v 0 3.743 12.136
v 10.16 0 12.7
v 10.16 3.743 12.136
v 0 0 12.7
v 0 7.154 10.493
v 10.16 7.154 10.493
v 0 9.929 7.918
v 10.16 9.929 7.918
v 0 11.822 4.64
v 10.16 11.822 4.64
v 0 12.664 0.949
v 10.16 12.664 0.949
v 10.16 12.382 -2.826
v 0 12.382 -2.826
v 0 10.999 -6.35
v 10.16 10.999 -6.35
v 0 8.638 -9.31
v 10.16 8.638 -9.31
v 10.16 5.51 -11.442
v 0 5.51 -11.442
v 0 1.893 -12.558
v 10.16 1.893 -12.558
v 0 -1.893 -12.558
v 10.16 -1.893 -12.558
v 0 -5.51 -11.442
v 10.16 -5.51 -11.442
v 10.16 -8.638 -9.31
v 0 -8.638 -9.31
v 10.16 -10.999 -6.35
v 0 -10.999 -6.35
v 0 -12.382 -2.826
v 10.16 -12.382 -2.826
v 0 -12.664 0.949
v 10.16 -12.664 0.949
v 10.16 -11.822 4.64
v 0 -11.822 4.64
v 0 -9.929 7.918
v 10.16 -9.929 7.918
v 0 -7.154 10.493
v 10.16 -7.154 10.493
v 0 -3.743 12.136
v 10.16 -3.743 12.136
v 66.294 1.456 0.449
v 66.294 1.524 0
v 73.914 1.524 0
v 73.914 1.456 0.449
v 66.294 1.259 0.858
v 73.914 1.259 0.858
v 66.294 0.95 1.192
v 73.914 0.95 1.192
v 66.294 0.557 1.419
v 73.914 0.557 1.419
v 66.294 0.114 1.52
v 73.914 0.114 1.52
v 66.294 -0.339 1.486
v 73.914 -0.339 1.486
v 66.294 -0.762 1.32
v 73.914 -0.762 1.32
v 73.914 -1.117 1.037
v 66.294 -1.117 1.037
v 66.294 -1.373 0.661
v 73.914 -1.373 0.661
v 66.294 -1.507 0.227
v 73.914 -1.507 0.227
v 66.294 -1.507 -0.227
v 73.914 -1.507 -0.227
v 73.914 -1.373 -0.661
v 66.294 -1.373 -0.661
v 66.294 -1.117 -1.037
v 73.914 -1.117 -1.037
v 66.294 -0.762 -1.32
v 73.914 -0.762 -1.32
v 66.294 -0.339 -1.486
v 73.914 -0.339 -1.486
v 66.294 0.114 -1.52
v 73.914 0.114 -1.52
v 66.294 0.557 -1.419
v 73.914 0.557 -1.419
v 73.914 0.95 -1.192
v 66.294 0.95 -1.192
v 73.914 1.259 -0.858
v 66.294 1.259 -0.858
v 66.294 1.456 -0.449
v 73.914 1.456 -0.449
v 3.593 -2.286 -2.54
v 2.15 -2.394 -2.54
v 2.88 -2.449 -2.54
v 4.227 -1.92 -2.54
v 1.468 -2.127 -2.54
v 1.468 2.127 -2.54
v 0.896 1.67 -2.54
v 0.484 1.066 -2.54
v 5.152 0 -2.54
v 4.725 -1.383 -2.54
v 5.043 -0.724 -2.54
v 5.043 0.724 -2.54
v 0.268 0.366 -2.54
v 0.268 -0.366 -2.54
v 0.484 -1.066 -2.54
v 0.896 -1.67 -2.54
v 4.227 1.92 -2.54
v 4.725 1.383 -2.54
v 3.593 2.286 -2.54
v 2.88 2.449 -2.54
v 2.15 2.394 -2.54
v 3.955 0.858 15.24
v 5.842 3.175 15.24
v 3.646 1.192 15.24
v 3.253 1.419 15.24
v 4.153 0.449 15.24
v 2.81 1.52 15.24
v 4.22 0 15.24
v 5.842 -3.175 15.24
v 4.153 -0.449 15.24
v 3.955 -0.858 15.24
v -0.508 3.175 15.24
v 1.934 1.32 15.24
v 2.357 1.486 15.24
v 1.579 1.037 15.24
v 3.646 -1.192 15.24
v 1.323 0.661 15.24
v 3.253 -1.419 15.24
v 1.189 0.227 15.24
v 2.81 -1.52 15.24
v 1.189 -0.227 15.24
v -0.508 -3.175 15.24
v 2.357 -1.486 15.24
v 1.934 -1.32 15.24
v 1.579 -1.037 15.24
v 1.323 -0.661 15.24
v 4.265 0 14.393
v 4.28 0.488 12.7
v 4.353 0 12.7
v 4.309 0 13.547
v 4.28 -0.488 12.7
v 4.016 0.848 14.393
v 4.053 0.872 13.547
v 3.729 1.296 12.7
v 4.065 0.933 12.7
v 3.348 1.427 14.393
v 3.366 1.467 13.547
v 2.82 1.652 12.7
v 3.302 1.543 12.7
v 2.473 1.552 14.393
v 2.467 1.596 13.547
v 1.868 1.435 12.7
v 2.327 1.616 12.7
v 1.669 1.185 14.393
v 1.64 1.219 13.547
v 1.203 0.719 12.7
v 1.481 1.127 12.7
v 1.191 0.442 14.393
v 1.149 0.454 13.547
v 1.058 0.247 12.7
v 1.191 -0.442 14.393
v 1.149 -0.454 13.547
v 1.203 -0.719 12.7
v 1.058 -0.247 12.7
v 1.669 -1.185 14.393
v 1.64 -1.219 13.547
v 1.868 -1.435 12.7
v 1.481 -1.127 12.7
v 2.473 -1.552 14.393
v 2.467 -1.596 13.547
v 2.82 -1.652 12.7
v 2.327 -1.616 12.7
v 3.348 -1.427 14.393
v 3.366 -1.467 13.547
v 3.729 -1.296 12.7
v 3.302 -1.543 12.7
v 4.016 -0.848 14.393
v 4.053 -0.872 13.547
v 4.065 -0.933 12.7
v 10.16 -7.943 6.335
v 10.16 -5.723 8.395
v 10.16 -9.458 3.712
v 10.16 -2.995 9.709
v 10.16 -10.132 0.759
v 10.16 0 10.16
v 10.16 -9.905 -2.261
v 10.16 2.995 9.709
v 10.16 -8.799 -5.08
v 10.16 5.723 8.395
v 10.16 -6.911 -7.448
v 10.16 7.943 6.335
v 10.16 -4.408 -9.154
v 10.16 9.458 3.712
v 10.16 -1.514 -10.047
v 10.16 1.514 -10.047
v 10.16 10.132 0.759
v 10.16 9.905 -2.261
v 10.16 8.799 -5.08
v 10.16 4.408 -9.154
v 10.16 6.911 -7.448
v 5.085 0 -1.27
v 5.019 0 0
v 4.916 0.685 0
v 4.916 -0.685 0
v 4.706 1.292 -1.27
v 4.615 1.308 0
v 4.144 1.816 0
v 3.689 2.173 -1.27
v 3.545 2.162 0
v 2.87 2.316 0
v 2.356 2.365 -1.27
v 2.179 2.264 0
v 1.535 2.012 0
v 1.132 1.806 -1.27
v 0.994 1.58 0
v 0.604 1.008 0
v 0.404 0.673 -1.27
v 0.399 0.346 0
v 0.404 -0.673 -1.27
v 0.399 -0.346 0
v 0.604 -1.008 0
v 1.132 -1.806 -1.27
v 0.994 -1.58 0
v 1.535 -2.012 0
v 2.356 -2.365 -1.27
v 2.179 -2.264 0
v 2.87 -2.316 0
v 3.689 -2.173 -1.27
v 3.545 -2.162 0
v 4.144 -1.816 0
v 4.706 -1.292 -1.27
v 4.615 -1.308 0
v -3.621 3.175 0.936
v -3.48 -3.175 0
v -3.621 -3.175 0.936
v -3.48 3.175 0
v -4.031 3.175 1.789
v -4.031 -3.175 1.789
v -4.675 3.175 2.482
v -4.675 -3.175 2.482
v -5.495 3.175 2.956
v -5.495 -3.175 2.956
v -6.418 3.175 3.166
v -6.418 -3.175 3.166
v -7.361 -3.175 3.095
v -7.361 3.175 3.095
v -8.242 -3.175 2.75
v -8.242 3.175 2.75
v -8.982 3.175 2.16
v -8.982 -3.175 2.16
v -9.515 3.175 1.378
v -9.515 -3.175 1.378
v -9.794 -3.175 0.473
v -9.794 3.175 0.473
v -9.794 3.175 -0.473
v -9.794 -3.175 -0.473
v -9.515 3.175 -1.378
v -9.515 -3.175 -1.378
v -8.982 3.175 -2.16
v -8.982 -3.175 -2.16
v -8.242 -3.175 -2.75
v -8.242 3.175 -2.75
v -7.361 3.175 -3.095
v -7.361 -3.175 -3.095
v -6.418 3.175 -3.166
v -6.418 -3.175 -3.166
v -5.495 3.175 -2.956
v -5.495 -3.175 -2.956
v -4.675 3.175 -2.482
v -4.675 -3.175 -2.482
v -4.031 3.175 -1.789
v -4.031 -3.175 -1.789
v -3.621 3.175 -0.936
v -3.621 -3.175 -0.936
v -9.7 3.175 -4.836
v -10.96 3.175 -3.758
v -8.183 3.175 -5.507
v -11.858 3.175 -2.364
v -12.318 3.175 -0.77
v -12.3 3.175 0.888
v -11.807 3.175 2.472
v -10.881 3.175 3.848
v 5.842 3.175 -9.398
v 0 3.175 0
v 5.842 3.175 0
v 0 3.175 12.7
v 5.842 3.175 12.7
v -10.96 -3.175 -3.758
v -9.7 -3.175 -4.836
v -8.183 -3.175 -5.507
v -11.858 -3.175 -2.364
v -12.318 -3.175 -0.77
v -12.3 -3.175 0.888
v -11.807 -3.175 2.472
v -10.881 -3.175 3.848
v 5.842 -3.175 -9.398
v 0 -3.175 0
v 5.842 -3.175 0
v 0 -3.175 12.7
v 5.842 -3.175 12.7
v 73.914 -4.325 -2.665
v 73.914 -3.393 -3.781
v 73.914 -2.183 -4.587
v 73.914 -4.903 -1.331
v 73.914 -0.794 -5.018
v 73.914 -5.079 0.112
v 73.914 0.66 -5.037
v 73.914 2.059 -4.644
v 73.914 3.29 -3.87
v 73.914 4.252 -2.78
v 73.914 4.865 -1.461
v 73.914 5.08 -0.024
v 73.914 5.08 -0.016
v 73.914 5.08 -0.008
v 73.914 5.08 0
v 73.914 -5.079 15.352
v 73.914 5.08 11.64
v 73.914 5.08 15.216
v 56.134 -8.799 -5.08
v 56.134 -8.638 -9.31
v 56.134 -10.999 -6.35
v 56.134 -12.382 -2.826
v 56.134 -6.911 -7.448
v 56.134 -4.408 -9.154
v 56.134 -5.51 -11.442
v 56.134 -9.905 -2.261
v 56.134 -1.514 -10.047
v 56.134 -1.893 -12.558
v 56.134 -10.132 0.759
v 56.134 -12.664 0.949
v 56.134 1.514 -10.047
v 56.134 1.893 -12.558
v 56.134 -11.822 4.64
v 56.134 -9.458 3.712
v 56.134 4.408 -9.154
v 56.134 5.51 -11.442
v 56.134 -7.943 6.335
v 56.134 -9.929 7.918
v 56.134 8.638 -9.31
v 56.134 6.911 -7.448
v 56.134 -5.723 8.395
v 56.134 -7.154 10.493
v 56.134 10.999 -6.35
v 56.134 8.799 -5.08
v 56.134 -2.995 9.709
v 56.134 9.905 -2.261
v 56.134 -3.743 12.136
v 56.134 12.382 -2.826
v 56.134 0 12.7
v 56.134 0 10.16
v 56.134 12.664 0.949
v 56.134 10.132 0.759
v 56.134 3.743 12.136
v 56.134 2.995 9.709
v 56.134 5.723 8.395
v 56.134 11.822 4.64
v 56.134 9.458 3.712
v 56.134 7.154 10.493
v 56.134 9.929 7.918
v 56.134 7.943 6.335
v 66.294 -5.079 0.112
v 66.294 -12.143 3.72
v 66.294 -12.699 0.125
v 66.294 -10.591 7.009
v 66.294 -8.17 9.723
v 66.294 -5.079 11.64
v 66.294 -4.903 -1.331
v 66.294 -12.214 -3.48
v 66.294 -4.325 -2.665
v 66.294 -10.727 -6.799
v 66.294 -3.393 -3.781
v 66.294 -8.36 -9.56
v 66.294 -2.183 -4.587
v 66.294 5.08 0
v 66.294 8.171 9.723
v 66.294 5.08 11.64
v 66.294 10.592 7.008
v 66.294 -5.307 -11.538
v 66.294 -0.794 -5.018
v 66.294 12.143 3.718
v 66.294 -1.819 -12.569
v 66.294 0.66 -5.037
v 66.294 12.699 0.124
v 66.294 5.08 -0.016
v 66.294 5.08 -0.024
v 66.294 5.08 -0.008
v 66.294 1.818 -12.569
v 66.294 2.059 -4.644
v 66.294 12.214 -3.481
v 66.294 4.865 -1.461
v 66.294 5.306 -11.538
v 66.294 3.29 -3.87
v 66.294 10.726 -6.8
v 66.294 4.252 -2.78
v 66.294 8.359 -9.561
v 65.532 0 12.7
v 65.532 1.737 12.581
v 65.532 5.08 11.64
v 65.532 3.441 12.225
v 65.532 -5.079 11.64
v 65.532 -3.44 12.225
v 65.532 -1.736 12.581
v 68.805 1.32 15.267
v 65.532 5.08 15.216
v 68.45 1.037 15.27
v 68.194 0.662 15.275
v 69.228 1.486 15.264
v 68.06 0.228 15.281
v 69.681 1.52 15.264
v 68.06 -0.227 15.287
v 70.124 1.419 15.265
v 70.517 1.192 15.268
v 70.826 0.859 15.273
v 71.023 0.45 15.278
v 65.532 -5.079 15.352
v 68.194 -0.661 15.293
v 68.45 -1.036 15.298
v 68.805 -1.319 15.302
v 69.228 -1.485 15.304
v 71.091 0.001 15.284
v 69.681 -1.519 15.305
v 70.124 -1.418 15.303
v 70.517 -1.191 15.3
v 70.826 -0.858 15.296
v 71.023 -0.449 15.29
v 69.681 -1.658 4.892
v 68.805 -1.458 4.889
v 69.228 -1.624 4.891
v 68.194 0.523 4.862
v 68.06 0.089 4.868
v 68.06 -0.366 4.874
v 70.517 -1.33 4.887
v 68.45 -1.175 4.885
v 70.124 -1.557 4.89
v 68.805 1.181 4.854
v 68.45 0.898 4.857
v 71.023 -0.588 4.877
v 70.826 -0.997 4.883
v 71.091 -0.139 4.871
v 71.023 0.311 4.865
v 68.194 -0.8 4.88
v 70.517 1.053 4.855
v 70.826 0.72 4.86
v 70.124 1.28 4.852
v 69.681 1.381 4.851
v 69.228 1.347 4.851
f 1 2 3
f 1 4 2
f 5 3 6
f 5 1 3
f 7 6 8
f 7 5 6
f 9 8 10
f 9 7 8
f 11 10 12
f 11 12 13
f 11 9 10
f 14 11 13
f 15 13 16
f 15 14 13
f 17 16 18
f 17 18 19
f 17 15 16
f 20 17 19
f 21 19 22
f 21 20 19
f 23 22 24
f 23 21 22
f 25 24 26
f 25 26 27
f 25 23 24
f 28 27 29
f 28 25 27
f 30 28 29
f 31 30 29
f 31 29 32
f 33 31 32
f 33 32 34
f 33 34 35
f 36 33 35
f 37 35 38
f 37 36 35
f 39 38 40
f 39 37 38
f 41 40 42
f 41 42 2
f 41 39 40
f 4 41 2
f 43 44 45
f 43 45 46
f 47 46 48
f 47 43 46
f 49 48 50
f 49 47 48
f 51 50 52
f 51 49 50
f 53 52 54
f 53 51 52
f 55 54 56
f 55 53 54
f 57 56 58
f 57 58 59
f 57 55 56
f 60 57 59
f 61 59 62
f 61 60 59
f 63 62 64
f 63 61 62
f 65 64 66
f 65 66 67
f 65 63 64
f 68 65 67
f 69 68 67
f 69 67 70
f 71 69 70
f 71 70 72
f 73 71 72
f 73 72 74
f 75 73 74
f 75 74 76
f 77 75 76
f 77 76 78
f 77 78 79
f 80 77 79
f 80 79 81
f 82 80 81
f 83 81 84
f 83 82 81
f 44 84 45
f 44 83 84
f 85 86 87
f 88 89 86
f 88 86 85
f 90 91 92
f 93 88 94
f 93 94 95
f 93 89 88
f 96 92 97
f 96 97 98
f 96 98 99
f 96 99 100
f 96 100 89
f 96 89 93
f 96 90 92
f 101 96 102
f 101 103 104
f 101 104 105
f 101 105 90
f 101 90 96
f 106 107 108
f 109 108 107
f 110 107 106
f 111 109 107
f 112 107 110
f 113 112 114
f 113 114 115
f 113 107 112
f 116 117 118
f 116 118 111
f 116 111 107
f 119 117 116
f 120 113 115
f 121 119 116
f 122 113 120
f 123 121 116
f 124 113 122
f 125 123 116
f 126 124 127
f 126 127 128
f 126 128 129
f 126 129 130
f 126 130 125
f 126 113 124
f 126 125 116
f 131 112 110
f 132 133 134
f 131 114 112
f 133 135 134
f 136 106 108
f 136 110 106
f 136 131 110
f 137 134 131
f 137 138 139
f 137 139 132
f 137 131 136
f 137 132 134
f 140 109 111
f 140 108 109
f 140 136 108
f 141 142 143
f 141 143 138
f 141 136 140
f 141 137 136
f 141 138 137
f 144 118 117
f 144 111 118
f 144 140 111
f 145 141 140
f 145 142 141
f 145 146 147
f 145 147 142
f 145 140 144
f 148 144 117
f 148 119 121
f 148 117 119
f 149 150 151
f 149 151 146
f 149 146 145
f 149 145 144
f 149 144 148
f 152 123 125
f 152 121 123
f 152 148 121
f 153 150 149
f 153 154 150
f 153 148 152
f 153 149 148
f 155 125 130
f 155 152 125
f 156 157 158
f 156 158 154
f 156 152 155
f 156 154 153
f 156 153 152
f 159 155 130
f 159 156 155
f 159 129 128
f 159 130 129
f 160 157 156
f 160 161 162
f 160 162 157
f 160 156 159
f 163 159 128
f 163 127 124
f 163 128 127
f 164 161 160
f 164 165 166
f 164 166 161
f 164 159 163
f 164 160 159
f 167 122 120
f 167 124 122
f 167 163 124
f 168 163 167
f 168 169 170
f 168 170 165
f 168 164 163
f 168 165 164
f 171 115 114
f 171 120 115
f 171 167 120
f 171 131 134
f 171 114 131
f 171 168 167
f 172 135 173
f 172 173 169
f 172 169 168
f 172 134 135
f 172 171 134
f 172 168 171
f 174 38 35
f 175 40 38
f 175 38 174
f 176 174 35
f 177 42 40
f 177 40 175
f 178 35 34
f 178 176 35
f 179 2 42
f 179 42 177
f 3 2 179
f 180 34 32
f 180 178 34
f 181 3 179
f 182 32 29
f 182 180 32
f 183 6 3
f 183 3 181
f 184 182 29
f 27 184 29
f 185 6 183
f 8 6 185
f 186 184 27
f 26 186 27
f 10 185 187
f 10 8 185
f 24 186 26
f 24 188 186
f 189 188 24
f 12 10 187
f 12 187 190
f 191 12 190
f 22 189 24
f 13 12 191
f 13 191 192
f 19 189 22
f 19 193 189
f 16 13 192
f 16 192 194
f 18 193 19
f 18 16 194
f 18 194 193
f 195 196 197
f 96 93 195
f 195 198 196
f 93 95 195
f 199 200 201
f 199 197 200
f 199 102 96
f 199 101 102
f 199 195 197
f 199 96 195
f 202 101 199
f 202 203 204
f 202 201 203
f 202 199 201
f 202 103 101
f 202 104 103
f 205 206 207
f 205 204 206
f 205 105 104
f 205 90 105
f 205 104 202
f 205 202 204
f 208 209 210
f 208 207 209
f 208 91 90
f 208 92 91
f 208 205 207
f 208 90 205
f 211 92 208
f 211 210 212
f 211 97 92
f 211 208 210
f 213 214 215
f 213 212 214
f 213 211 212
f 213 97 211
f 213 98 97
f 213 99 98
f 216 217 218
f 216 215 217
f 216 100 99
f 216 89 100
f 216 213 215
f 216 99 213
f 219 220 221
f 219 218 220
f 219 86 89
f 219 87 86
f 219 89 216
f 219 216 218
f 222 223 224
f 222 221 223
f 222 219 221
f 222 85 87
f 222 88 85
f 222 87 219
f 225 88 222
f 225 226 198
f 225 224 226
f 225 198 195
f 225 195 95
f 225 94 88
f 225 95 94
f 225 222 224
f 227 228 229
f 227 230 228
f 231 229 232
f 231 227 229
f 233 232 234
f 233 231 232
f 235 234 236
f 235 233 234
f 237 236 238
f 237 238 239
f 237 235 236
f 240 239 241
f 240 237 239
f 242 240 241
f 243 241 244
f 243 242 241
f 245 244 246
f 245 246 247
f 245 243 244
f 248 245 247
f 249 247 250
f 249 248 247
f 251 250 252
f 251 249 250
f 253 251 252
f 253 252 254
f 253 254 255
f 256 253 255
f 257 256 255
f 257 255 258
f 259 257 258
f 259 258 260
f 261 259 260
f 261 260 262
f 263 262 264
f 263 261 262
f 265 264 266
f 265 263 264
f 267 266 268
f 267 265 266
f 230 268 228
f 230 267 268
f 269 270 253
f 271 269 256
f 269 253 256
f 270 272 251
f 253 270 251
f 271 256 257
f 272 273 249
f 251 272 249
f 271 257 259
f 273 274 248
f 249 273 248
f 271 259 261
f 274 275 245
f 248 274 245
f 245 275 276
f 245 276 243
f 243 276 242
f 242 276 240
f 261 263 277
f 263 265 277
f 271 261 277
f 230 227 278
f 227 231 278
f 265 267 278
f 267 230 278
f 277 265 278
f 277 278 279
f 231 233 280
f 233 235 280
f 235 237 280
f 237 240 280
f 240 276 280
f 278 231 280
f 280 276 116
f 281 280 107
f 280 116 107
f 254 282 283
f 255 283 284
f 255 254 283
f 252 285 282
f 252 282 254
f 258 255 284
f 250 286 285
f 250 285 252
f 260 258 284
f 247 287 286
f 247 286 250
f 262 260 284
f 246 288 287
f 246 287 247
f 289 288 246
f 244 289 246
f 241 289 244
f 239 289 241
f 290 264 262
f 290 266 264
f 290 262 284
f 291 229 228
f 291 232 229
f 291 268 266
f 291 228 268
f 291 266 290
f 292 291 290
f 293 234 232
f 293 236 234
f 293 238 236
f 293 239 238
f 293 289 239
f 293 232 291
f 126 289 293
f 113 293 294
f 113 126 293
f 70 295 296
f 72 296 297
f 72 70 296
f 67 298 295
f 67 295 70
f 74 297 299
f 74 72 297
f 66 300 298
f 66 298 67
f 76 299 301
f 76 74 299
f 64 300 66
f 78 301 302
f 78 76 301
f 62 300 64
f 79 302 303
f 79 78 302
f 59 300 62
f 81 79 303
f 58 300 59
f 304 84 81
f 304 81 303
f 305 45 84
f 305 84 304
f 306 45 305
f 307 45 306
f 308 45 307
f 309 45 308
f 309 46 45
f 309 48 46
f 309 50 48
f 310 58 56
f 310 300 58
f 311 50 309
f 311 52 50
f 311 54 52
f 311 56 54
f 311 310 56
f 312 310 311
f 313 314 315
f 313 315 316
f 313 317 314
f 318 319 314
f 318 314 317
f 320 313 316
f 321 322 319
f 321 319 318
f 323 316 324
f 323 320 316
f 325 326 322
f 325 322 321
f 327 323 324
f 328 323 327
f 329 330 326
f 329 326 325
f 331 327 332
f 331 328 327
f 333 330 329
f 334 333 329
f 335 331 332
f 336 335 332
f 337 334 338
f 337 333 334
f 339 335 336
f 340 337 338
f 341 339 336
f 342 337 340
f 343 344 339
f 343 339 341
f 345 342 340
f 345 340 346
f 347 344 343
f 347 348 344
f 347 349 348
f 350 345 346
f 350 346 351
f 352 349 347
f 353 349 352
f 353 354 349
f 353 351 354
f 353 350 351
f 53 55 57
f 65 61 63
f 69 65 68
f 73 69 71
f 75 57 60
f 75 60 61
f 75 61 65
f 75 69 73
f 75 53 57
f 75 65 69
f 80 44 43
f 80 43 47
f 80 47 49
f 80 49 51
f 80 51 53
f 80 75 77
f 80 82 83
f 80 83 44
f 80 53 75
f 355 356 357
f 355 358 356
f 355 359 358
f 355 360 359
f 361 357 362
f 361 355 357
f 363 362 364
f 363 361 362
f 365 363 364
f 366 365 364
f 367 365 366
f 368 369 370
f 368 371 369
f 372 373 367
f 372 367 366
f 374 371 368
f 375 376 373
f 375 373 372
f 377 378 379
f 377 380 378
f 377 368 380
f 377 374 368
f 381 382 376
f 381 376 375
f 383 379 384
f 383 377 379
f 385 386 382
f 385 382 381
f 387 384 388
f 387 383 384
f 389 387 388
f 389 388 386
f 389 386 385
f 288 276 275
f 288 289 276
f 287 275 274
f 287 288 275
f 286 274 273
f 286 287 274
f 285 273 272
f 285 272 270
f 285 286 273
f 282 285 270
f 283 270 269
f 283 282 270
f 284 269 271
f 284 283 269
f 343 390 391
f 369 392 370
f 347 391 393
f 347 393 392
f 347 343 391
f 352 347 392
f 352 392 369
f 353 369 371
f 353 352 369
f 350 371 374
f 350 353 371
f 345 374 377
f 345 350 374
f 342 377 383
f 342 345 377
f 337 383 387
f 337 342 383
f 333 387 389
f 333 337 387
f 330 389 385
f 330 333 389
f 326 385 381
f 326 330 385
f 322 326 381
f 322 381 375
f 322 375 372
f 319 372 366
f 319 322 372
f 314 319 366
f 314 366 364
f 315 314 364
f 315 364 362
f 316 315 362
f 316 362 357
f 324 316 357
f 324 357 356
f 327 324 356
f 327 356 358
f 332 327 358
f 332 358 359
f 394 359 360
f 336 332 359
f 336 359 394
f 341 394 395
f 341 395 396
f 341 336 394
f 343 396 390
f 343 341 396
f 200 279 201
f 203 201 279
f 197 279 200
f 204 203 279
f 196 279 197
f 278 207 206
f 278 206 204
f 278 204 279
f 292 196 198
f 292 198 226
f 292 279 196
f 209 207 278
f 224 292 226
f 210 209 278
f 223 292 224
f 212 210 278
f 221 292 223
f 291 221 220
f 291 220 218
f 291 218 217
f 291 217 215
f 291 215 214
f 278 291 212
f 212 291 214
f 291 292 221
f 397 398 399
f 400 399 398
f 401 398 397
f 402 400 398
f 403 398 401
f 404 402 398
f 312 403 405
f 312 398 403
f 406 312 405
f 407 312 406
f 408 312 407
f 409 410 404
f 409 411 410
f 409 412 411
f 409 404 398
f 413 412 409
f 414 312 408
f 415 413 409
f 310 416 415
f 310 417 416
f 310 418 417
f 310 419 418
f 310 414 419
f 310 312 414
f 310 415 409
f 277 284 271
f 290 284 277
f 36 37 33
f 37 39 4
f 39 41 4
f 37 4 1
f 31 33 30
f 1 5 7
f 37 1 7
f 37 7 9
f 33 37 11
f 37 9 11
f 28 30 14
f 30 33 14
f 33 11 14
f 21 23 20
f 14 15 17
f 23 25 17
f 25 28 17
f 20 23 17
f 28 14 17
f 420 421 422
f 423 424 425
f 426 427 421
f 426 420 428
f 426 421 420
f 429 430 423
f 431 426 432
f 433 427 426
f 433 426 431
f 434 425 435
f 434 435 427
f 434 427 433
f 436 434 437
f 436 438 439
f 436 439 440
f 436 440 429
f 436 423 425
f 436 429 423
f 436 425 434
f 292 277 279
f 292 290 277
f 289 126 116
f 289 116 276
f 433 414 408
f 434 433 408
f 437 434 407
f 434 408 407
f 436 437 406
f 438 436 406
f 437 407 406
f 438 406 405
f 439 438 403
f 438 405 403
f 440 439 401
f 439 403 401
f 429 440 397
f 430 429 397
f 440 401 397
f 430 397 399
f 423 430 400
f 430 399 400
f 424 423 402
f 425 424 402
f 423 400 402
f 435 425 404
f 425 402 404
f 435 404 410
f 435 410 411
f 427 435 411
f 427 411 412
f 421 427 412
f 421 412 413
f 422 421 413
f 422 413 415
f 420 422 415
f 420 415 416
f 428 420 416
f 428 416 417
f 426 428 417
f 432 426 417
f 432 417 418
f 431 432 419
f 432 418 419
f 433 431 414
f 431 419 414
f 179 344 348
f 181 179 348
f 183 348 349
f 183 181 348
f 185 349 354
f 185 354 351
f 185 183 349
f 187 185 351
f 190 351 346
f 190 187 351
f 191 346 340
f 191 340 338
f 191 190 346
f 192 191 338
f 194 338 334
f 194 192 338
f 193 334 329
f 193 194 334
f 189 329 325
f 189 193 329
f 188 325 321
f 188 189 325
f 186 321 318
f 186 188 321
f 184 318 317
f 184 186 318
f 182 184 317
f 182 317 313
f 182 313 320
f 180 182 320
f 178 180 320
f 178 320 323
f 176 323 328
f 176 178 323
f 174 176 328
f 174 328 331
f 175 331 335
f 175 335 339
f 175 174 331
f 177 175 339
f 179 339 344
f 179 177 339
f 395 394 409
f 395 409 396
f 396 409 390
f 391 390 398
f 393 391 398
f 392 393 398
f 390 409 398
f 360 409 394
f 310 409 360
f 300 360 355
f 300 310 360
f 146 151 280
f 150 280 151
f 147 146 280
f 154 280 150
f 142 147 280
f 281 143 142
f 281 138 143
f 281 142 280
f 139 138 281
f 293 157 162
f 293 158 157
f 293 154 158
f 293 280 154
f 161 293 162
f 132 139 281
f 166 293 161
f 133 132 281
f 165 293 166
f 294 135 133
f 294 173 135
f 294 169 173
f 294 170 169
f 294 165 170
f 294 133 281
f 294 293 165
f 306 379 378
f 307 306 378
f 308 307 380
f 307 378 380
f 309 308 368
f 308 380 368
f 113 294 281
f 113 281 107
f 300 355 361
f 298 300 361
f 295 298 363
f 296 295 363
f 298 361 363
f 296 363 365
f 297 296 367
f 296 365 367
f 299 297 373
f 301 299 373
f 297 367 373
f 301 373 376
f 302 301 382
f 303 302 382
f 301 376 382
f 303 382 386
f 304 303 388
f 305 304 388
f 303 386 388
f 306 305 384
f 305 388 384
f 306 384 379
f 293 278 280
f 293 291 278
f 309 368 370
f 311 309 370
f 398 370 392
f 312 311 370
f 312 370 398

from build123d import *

# Parameters (mm, degrees)
F0_W          = 5.842
F0_H          = 12.7
F0_R          = 3.175
F2_DEPTH      = 3.175
F3_R          = 1.524
F4_DEPTH      = 7.62
F4_DEPTH_BACK = 0.762
F5_R          = 1.524
F6_DEPTH      = 17.78
F6_TAPER      = -3
F7_R          = 1.524
F8_DEPTH      = 10.414


# Not quite as in the source:
# - ends of sketch curves that miss each other by under 0.0002 mm in the source are joined


with BuildPart() as f1:
    # F0 (on Front) → F1 (revolve)
    with BuildSketch(Plane.XZ):
        Polygon((5.842, 12.7), (5.842, 0), (66.294, 0), (66.294, 12.7), (56.134, 12.7), (56.134, 10.16), (10.16, 10.16), (10.16, 12.7), align=None)
        with Locations((2.921, 6.35)):
            Rectangle(F0_W, F0_H)
    revolve(axis=Axis((33.147, 0, 0), (-1, 0, 0)))

    # F3 (on face) → F4 (join, two sides)
    with BuildSketch(Plane.YZ.offset(66.294)) as f4_sk:
        with BuildLine():
            ThreePointArc((5.0799454558, -0.0235407301), (5.0799863639, -0.0117703966), (5.08, 0))
            ThreePointArc((5.08, 0), (0.056082159, 5.0796904228), (-5.0787617289, 0.1121574827))
            ThreePointArc((-5.0787617289, 0.1121574827), (-0.0678516878, -5.0795468448), (5.0799454558, -0.0235407301))
        make_face()
        Circle(F3_R, mode=Mode.SUBTRACT)
        with BuildLine():
            ThreePointArc((-5.0787617289, 11.6402826126), (0.0006457603, 12.6999999836), (5.0799454558, 11.6397660701))
            Line((5.0799454558, 11.6397660701), (5.0799454558, 15.2164592699))
            Line((5.0799454558, 15.2164592699), (-5.0787617289, 15.3521574827))
            Line((-5.0787617289, 15.3521574827), (-5.0787617289, 11.6402826126))
        make_face()
        with BuildLine():
            ThreePointArc((-5.0787617289, 0.1121574827), (0.056082159, 5.0796904228), (5.08, 0))
            Line((5.08, 0), (5.0799454558, 11.6397660701))
            ThreePointArc((5.0799454558, 11.6397660701), (0.0006457603, 12.6999999836), (-5.0787617289, 11.6402826126))
            Line((-5.0787617289, 11.6402826126), (-5.0787617289, 0.1121574827))
        make_face()
    extrude(amount=F4_DEPTH)
    extrude(f4_sk.sketch, amount=-F4_DEPTH_BACK)

    # F7 (on face) → F8 (cut)
    with BuildSketch(Plane(origin=(0, 0.2041287691, 15.2815895663), x_dir=(1, 0, 0), z_dir=(0, 0.0133566315, 0.9999107962))):
        with Locations((69.5667713881, -0.2035550635)):
            Circle(F7_R)
    extrude(amount=-F8_DEPTH, mode=Mode.SUBTRACT)


with BuildPart() as f2:
    # F0 (on Front) → F2 (new body, symmetric)
    with BuildSketch(Plane.XZ):
        with BuildLine():
            Line((-0.9398, 0), (0, 0))
            Line((0, 0), (0, 12.7))
            Line((0, 12.7), (5.842, 12.7))
            Line((5.842, 12.7), (5.842, 15.24))
            Line((5.842, 15.24), (-0.508, 15.24))
            Line((-0.508, 15.24), (-10.8806298187, 3.8475430269))
            ThreePointArc((-10.8806298187, 3.8475430269), (-4.5919612295, 5.3297205562), (-0.9398, 0))
        make_face()
        with BuildLine():
            Line((5.842, 0), (0, 0))
            Line((0, 0), (-0.9398, 0))
            ThreePointArc((-0.9398, 0), (-3.1957909266, -4.5493385486), (-8.1826630726, -5.5069827884))
            Line((-8.1826630726, -5.5069827884), (5.842, -9.398))
            Line((5.842, -9.398), (5.842, 0))
        make_face()
        with BuildLine():
            ThreePointArc((-8.1826630726, -5.5069827884), (-3.1957909266, -4.5493385486), (-0.9398, 0))
            ThreePointArc((-0.9398, 0), (-4.5919612295, 5.3297205562), (-10.8806298187, 3.8475430269))
            ThreePointArc((-10.8806298187, 3.8475430269), (-12.1459778134, -1.5837270034), (-8.1826630726, -5.5069827884))
        make_face()
        with Locations((-6.6548, 0)):
            Circle(F0_R, mode=Mode.SUBTRACT)
    extrude(amount=F2_DEPTH, both=True)

    # F5 (on face) → F6 (cut)
    with BuildSketch(Plane.XY.offset(15.24)):
        with Locations((2.6962365955, 0)):
            Circle(F5_R)
    extrude(amount=-F6_DEPTH, taper=F6_TAPER, mode=Mode.SUBTRACT)


solid = Compound([f1.part, f2.part])
